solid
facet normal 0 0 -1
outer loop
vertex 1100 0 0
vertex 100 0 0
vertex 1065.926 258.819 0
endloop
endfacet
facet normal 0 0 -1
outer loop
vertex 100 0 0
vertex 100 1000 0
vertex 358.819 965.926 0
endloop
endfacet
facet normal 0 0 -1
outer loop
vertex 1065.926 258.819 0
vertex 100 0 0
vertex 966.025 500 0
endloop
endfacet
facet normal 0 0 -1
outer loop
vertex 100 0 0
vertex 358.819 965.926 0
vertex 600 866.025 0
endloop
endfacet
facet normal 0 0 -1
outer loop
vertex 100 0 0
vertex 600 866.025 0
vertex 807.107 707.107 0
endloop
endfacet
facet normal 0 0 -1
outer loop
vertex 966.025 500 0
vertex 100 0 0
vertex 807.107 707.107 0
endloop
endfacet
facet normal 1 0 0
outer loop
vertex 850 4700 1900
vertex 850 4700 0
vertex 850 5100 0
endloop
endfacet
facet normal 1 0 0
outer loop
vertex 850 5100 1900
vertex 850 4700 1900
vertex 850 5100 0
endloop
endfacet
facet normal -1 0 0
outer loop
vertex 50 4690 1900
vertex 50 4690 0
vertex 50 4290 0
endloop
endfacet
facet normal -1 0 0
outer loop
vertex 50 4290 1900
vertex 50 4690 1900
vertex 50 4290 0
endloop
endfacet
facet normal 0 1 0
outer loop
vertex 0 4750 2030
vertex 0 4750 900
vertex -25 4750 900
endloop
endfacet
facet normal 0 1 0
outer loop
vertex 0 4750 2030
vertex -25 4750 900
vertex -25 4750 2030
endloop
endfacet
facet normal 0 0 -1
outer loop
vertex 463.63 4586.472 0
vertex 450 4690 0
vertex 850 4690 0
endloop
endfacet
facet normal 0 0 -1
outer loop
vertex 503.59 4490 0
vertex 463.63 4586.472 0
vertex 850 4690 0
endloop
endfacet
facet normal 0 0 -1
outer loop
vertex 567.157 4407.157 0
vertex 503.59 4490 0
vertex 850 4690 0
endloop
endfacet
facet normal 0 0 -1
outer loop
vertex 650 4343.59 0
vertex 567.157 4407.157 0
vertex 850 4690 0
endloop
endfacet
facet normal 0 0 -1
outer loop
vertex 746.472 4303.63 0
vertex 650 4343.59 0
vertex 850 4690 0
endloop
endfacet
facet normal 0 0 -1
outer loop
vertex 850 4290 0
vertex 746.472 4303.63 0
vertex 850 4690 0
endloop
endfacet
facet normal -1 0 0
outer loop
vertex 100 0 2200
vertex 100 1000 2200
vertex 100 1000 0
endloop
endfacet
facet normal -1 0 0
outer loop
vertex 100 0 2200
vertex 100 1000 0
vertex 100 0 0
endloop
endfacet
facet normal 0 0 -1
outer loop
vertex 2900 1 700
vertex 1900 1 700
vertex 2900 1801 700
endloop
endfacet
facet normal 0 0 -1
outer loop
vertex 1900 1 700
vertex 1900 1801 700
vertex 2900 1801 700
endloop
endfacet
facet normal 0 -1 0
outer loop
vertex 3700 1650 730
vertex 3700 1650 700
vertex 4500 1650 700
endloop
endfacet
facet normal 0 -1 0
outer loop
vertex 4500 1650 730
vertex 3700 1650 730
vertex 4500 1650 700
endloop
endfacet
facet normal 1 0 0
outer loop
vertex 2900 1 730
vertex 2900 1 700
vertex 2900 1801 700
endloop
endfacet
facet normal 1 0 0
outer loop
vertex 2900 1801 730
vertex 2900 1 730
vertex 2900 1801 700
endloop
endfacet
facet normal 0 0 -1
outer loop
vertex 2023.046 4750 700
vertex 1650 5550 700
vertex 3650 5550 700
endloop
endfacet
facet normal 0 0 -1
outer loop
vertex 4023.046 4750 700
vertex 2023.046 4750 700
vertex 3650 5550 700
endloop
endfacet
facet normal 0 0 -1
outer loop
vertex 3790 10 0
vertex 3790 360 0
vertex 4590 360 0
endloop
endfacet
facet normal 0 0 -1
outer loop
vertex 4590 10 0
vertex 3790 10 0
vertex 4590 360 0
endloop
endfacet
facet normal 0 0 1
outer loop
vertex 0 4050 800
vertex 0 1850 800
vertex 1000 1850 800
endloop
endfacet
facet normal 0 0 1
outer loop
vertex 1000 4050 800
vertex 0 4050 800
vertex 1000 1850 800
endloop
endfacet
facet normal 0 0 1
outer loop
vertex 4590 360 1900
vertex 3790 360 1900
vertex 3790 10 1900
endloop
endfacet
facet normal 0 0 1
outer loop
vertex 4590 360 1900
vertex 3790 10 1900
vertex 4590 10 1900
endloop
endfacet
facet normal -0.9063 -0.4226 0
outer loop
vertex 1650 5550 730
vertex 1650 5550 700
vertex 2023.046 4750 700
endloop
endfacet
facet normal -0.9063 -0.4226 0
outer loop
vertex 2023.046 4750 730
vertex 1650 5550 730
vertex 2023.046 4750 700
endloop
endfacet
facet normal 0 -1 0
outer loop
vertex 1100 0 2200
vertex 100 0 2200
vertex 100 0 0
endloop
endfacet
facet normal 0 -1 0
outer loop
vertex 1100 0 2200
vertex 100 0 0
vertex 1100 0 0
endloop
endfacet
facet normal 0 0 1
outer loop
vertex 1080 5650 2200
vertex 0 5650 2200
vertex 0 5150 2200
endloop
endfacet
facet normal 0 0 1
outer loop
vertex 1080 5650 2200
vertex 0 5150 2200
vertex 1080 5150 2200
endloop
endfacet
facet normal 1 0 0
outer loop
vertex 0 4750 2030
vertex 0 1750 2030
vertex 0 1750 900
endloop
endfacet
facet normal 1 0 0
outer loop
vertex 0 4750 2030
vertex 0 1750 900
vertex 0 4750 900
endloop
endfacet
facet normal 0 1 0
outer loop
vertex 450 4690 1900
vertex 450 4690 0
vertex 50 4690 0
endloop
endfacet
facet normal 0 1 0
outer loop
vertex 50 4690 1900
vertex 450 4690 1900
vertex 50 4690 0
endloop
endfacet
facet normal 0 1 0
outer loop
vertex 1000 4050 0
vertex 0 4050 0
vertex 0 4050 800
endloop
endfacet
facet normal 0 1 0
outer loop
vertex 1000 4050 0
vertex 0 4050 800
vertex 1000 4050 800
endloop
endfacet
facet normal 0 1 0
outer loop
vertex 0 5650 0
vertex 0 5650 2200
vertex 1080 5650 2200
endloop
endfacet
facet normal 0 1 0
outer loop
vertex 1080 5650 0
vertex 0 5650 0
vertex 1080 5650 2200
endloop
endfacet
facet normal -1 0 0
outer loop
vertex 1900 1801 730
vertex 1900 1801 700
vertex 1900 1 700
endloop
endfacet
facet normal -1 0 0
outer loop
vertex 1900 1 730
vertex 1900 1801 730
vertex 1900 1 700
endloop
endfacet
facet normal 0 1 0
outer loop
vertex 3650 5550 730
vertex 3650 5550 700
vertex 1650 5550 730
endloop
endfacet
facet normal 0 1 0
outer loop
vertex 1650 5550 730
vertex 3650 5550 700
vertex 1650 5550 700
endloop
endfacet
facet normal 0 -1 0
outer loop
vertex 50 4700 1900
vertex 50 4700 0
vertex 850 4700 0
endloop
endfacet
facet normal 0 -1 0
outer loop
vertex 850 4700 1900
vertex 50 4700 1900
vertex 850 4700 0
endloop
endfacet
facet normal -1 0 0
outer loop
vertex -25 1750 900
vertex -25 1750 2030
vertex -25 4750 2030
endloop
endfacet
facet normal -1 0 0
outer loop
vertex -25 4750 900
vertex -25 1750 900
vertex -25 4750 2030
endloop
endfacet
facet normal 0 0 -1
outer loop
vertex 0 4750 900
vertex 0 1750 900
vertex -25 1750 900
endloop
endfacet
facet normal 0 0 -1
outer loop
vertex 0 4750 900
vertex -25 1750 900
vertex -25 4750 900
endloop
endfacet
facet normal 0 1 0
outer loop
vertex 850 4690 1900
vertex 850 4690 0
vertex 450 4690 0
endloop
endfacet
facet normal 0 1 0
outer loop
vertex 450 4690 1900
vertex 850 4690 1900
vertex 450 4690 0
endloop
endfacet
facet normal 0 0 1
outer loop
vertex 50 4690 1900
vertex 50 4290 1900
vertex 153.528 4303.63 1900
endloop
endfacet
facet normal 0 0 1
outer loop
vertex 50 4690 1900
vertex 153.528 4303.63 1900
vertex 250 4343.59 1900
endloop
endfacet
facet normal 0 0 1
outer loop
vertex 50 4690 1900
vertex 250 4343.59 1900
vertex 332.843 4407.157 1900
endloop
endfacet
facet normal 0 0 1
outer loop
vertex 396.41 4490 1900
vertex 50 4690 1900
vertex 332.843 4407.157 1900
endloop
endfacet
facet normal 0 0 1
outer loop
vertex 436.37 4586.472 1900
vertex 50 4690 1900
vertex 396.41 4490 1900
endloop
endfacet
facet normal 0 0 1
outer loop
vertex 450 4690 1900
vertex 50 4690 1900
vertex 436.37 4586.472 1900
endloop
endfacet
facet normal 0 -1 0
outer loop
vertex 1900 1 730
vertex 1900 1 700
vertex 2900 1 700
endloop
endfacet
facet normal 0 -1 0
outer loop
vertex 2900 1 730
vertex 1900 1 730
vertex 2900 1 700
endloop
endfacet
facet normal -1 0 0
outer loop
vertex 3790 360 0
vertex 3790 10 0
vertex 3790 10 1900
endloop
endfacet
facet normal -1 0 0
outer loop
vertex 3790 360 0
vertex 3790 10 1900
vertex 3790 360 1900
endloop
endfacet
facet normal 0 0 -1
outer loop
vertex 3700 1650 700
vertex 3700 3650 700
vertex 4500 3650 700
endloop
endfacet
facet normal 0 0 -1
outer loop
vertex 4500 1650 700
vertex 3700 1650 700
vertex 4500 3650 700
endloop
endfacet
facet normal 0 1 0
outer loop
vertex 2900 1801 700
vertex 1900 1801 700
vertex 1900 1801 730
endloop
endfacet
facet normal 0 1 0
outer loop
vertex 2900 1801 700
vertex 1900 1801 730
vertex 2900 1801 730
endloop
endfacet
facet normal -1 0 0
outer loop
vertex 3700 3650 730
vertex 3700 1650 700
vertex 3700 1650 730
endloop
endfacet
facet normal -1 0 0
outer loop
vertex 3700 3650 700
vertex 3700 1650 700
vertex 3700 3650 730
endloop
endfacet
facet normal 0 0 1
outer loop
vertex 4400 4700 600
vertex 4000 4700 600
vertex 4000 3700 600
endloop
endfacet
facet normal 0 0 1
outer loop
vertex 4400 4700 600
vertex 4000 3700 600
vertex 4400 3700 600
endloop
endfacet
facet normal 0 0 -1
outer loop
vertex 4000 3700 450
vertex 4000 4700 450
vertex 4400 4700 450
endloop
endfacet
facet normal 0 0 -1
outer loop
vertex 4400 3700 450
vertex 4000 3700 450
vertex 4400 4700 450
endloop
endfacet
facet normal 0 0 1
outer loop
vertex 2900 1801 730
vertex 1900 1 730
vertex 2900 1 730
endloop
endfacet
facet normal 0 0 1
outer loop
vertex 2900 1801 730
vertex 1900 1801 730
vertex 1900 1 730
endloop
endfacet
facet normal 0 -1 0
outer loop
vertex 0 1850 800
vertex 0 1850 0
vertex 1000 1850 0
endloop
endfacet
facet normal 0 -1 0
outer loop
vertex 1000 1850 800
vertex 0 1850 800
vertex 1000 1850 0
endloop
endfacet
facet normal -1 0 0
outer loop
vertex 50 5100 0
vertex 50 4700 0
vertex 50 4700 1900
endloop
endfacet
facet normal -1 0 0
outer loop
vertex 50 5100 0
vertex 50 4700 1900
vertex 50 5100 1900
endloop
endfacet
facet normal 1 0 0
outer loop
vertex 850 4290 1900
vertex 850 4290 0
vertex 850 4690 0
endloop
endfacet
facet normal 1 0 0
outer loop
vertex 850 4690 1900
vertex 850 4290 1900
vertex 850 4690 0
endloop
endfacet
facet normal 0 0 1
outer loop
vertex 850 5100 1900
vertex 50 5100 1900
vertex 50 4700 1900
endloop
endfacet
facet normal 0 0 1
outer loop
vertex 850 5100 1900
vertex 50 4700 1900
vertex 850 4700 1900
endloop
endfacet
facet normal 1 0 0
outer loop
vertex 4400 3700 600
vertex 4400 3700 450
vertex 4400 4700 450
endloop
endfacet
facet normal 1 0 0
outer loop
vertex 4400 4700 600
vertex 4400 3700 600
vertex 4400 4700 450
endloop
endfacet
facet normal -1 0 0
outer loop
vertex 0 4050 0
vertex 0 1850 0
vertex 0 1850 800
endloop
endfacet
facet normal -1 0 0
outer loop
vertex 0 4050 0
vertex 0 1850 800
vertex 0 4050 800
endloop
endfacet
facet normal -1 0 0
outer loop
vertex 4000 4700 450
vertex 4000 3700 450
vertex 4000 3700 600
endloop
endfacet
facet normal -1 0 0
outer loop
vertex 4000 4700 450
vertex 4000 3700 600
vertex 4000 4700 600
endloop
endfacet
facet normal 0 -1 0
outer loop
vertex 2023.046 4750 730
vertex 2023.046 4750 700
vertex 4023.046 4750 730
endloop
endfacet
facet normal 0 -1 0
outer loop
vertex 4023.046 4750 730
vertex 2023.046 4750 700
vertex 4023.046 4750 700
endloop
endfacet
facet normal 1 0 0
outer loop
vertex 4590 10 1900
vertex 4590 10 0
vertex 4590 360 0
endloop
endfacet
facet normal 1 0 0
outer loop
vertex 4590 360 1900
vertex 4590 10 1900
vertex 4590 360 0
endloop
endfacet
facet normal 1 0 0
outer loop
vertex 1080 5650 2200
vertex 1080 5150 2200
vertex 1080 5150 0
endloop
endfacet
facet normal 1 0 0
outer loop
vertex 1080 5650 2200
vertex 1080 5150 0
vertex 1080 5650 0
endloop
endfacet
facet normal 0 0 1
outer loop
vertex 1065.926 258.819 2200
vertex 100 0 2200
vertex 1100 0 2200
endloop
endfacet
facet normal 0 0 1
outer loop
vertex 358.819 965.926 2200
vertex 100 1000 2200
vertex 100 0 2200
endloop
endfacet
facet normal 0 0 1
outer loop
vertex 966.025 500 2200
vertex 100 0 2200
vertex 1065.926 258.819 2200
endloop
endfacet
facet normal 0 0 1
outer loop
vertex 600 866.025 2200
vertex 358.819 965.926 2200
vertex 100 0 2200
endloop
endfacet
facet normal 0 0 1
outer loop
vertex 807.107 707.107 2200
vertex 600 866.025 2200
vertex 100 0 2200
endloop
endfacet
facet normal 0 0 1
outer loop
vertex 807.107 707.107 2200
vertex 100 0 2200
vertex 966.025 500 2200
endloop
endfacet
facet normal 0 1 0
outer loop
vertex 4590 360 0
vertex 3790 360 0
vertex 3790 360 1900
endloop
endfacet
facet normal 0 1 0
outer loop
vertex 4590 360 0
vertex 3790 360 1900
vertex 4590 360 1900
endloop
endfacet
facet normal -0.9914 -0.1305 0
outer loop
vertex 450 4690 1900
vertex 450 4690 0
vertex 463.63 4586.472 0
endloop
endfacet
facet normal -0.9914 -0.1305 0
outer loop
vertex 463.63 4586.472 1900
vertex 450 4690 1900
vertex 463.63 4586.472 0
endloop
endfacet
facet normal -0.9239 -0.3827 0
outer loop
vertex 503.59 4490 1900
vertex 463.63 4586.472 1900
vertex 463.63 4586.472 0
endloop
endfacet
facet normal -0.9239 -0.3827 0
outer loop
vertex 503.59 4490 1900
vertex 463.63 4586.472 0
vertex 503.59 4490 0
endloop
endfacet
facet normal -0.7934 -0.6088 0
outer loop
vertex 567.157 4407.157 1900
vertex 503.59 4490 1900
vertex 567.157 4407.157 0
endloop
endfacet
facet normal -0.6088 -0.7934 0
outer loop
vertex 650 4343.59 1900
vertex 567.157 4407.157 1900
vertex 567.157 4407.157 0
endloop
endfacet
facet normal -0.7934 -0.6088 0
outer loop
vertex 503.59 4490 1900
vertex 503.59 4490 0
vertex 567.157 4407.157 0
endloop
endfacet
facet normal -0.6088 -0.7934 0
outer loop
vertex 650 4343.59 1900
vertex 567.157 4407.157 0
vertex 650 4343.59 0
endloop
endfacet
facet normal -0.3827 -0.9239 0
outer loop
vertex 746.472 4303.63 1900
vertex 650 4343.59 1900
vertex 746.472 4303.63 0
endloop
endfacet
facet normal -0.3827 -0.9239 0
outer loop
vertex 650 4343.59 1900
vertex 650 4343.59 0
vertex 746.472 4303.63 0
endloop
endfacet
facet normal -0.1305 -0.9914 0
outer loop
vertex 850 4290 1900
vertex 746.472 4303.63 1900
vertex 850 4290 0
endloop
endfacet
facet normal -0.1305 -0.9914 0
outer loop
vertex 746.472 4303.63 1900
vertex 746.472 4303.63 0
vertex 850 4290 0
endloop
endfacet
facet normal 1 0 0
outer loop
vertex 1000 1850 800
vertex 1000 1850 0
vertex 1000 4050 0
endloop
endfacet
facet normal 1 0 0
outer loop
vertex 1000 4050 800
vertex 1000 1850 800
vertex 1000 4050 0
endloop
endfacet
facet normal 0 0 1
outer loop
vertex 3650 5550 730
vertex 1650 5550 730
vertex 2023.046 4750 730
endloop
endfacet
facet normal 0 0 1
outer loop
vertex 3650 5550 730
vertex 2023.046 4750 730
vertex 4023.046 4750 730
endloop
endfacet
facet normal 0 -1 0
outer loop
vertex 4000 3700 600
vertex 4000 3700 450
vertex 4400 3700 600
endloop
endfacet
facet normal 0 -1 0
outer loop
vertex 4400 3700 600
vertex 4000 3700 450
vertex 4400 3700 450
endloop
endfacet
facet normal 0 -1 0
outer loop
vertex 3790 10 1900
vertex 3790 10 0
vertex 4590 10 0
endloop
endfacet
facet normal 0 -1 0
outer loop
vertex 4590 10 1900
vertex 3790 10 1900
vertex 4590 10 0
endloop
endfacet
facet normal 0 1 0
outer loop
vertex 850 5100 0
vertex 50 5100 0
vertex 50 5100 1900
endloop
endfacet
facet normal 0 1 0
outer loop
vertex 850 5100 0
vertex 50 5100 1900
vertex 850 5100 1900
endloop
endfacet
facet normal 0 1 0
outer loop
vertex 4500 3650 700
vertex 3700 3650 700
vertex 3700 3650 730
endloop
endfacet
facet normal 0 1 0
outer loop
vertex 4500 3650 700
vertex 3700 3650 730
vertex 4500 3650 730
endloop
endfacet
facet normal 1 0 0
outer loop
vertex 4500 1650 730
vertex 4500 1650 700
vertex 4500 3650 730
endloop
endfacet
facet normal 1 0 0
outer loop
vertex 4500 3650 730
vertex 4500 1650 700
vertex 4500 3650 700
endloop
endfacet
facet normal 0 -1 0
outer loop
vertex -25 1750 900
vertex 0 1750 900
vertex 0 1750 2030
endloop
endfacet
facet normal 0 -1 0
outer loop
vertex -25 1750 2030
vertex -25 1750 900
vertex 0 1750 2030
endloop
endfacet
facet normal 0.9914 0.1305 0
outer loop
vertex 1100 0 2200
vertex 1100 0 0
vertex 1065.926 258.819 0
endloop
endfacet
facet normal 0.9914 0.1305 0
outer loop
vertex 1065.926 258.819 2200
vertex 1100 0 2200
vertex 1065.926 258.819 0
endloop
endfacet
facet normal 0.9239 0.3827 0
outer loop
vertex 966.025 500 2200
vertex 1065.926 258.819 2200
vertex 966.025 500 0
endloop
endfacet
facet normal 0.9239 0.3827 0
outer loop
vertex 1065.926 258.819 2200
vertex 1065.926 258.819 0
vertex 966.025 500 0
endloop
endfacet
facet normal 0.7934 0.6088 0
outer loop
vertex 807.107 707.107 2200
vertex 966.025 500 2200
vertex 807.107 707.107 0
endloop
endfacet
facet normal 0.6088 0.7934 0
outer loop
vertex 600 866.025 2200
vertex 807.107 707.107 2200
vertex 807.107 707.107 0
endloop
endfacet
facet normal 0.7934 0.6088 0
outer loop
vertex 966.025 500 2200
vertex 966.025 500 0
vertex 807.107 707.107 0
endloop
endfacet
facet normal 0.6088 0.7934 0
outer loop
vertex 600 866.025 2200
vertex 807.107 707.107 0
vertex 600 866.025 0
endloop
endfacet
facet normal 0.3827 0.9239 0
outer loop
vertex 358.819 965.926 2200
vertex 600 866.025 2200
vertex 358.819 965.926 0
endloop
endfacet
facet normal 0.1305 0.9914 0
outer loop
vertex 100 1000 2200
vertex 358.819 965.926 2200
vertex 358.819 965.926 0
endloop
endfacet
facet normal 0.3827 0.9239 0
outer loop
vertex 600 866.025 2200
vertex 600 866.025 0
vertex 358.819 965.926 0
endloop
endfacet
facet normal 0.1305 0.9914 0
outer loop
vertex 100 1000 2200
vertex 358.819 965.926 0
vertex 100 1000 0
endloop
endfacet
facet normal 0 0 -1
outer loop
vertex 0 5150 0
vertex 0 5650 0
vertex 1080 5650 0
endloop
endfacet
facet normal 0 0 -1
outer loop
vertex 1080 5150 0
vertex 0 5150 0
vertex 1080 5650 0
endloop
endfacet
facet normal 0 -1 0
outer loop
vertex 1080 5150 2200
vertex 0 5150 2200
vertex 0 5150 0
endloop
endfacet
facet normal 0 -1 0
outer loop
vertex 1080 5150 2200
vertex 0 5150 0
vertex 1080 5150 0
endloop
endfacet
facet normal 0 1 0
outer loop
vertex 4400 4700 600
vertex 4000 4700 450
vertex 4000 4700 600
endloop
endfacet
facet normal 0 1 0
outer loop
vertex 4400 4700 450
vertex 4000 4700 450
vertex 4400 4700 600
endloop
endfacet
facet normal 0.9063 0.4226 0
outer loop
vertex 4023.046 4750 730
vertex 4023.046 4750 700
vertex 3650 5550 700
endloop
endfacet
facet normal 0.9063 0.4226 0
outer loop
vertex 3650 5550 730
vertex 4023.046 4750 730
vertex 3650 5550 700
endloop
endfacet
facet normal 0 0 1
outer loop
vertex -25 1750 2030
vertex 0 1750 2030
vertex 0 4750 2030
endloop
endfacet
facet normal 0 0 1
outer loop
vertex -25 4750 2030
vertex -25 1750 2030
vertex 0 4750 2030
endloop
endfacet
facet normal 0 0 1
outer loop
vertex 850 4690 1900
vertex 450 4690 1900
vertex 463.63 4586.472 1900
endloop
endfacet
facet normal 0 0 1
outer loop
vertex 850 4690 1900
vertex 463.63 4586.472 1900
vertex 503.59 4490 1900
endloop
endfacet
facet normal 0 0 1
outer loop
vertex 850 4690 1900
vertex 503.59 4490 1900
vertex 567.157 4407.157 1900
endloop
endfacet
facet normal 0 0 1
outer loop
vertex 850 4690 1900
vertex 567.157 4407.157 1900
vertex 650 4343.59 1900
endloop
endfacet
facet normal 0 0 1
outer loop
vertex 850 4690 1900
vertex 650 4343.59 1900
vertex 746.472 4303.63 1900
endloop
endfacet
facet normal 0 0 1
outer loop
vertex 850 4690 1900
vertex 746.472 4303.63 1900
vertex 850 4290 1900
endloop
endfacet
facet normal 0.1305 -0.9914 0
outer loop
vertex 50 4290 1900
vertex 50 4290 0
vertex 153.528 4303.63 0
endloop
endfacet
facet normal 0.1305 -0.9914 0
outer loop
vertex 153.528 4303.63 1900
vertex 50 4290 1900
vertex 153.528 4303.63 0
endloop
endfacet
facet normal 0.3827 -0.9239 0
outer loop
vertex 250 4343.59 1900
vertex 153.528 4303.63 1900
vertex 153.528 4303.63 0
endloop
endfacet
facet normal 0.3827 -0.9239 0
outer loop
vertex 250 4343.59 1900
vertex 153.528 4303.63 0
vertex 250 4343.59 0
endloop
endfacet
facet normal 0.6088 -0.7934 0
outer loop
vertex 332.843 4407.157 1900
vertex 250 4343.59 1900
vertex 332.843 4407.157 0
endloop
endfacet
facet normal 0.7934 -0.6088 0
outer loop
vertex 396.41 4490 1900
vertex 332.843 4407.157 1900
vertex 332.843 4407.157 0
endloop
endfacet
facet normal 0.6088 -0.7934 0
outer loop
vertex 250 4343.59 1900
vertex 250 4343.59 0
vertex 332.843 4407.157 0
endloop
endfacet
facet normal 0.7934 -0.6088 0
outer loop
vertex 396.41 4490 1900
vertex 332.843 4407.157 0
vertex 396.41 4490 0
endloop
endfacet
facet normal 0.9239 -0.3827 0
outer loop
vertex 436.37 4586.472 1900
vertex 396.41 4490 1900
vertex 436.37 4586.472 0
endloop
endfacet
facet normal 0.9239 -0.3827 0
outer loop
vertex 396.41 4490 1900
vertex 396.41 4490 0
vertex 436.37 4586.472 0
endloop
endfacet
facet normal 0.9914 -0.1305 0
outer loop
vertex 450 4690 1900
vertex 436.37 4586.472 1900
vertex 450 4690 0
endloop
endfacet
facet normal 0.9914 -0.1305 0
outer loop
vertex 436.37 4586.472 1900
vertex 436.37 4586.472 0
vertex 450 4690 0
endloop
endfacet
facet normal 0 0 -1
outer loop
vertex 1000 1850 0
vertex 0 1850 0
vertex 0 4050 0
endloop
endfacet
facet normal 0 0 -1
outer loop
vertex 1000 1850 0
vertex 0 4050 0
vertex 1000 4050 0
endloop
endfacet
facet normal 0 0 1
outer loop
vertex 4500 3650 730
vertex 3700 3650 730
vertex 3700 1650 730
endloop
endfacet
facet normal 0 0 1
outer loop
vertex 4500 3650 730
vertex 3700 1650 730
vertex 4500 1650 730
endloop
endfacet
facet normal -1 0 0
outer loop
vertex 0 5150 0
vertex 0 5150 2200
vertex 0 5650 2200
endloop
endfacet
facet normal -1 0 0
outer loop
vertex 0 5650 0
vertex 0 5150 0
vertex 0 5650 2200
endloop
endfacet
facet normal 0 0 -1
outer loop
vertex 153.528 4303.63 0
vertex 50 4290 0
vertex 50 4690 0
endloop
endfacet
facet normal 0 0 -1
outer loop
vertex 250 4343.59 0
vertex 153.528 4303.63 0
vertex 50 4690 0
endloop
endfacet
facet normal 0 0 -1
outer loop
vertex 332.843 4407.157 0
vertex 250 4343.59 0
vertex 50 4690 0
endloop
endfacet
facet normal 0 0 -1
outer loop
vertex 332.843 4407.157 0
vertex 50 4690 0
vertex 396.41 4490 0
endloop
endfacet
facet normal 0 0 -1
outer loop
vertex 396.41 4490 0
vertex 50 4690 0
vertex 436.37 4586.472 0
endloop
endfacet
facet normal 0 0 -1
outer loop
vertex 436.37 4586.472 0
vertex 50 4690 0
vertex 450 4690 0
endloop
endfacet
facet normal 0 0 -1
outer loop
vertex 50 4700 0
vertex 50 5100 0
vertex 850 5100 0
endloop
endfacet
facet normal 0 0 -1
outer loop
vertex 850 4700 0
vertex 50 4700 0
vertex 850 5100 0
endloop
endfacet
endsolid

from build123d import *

# Parameters (mm, degrees)
F5_DEPTH  = 2200
F1_W      = 1080
F1_H      = 500
F6_DEPTH  = 2200
F7_START  = 700
F4_W      = 800
F4_H      = 2000
F7_DEPTH  = 30
F8_START  = 450
F4_W_2    = 400
F4_H_2    = 1000
F8_DEPTH  = 150
F9_START  = 700
F2_W      = 1000
F2_H      = 1200
F2_H_2    = 600
F9_DEPTH  = 30
F11_START = 700
F11_DEPTH = 30
F12_W     = 3000
F12_H     = 1130
F13_DEPTH = 25
F10_W     = 1000
F10_H     = 2200
F14_DEPTH = 800
F15_W     = 800
F15_H     = 400
F16_DEPTH = 1900
F15_H_2   = 350
F18_DEPTH = 1900


# Not quite as in the source:
# - a feature names something its author has since deleted; it is built from what else it names


with BuildPart() as f5:
    # F3 (on Top) → F5 (new body)
    with BuildSketch(Plane.XY):
        with BuildLine():
            Line((100, 0), (1100, 0))
            ThreePointArc((1100, 0), (807.1067811865, 707.1067811865), (100, 1000))
            Line((100, 1000), (100, 0))
        make_face()
    extrude(amount=F5_DEPTH)


with BuildPart() as f6:
    # F1 (on Top) → F6 (new body)
    with BuildSketch(Plane.XY):
        with Locations((540, 5400)):
            Rectangle(F1_W, F1_H)
    extrude(amount=F6_DEPTH)


with BuildPart() as f7:
    # F4 (on Top) → F7 (new body)
    with BuildSketch(Plane.XY.offset(F7_START)):
        with Locations((4100, 2650)):
            Rectangle(F4_W, F4_H)
    extrude(amount=F7_DEPTH)


with BuildPart() as f8:
    # F4 (on Top) → F8 (new body)
    with BuildSketch(Plane.XY.offset(F8_START)):
        with Locations((4200, 4200)):
            Rectangle(F4_W_2, F4_H_2)
    extrude(amount=F8_DEPTH)


with BuildPart() as f9:
    # F2 (on Top) → F9 (new body)
    with BuildSketch(Plane.XY.offset(F9_START)):
        with Locations((2400, 601)):
            Rectangle(F2_W, F2_H)
        with Locations((2400, 1501)):
            Rectangle(F2_W, F2_H_2)
    extrude(amount=F9_DEPTH)


with BuildPart() as f11:
    # F4 (on Top) → F11 (new body)
    with BuildSketch(Plane.XY.offset(F11_START)):
        Polygon((3650, 5550), (1650, 5550), (2023.046126524, 4750), (4023.046126524, 4750), align=None)
    extrude(amount=F11_DEPTH)


with BuildPart() as f13:
    # F12 (on Right) → F13 (new body)
    with BuildSketch(Plane.YZ):
        with Locations((3250, 1465)):
            Rectangle(F12_W, F12_H)
    extrude(amount=-F13_DEPTH)


with BuildPart() as f14:
    # F10 (on Top) → F14 (new body)
    with BuildSketch(Plane.XY):
        with Locations((500, 2950)):
            Rectangle(F10_W, F10_H)
    extrude(amount=F14_DEPTH)


with BuildPart() as f16:
    # F15 (on Top) → F16 (new body)
    with BuildSketch(Plane.XY):
        with Locations((450, 4900)):
            Rectangle(F15_W, F15_H)
    extrude(amount=F16_DEPTH)


with BuildPart() as f16b:
    # F15 (on Top) → F16, piece 2 (new body)
    with BuildSketch(Plane.XY):
        with Locations((4190, 185)):
            Rectangle(F15_W, F15_H_2)
    extrude(amount=F16_DEPTH)


with BuildPart() as f18:
    # F17 (on Top) → F18 (new body)
    with BuildSketch(Plane.XY):
        with BuildLine():
            Line((850, 4690), (450, 4690))
            ThreePointArc((450, 4690), (567.1572875254, 4407.1572875254), (850, 4290))
            Line((850, 4290), (850, 4690))
        make_face()
    extrude(amount=F18_DEPTH)

    # F17 (on Top) → F18, piece 2 (join)
    with BuildSketch(Plane.XY):
        with BuildLine():
            Line((450, 4690), (50, 4690))
            Line((50, 4690), (50, 4290))
            ThreePointArc((50, 4290), (332.8427124746, 4407.1572875254), (450, 4690))
        make_face()
    extrude(amount=F18_DEPTH)


solid = Compound([f5.part, f6.part, f7.part, f8.part, f9.part, f11.part, f13.part, f14.part, f16.part, f16b.part, f18.part])
